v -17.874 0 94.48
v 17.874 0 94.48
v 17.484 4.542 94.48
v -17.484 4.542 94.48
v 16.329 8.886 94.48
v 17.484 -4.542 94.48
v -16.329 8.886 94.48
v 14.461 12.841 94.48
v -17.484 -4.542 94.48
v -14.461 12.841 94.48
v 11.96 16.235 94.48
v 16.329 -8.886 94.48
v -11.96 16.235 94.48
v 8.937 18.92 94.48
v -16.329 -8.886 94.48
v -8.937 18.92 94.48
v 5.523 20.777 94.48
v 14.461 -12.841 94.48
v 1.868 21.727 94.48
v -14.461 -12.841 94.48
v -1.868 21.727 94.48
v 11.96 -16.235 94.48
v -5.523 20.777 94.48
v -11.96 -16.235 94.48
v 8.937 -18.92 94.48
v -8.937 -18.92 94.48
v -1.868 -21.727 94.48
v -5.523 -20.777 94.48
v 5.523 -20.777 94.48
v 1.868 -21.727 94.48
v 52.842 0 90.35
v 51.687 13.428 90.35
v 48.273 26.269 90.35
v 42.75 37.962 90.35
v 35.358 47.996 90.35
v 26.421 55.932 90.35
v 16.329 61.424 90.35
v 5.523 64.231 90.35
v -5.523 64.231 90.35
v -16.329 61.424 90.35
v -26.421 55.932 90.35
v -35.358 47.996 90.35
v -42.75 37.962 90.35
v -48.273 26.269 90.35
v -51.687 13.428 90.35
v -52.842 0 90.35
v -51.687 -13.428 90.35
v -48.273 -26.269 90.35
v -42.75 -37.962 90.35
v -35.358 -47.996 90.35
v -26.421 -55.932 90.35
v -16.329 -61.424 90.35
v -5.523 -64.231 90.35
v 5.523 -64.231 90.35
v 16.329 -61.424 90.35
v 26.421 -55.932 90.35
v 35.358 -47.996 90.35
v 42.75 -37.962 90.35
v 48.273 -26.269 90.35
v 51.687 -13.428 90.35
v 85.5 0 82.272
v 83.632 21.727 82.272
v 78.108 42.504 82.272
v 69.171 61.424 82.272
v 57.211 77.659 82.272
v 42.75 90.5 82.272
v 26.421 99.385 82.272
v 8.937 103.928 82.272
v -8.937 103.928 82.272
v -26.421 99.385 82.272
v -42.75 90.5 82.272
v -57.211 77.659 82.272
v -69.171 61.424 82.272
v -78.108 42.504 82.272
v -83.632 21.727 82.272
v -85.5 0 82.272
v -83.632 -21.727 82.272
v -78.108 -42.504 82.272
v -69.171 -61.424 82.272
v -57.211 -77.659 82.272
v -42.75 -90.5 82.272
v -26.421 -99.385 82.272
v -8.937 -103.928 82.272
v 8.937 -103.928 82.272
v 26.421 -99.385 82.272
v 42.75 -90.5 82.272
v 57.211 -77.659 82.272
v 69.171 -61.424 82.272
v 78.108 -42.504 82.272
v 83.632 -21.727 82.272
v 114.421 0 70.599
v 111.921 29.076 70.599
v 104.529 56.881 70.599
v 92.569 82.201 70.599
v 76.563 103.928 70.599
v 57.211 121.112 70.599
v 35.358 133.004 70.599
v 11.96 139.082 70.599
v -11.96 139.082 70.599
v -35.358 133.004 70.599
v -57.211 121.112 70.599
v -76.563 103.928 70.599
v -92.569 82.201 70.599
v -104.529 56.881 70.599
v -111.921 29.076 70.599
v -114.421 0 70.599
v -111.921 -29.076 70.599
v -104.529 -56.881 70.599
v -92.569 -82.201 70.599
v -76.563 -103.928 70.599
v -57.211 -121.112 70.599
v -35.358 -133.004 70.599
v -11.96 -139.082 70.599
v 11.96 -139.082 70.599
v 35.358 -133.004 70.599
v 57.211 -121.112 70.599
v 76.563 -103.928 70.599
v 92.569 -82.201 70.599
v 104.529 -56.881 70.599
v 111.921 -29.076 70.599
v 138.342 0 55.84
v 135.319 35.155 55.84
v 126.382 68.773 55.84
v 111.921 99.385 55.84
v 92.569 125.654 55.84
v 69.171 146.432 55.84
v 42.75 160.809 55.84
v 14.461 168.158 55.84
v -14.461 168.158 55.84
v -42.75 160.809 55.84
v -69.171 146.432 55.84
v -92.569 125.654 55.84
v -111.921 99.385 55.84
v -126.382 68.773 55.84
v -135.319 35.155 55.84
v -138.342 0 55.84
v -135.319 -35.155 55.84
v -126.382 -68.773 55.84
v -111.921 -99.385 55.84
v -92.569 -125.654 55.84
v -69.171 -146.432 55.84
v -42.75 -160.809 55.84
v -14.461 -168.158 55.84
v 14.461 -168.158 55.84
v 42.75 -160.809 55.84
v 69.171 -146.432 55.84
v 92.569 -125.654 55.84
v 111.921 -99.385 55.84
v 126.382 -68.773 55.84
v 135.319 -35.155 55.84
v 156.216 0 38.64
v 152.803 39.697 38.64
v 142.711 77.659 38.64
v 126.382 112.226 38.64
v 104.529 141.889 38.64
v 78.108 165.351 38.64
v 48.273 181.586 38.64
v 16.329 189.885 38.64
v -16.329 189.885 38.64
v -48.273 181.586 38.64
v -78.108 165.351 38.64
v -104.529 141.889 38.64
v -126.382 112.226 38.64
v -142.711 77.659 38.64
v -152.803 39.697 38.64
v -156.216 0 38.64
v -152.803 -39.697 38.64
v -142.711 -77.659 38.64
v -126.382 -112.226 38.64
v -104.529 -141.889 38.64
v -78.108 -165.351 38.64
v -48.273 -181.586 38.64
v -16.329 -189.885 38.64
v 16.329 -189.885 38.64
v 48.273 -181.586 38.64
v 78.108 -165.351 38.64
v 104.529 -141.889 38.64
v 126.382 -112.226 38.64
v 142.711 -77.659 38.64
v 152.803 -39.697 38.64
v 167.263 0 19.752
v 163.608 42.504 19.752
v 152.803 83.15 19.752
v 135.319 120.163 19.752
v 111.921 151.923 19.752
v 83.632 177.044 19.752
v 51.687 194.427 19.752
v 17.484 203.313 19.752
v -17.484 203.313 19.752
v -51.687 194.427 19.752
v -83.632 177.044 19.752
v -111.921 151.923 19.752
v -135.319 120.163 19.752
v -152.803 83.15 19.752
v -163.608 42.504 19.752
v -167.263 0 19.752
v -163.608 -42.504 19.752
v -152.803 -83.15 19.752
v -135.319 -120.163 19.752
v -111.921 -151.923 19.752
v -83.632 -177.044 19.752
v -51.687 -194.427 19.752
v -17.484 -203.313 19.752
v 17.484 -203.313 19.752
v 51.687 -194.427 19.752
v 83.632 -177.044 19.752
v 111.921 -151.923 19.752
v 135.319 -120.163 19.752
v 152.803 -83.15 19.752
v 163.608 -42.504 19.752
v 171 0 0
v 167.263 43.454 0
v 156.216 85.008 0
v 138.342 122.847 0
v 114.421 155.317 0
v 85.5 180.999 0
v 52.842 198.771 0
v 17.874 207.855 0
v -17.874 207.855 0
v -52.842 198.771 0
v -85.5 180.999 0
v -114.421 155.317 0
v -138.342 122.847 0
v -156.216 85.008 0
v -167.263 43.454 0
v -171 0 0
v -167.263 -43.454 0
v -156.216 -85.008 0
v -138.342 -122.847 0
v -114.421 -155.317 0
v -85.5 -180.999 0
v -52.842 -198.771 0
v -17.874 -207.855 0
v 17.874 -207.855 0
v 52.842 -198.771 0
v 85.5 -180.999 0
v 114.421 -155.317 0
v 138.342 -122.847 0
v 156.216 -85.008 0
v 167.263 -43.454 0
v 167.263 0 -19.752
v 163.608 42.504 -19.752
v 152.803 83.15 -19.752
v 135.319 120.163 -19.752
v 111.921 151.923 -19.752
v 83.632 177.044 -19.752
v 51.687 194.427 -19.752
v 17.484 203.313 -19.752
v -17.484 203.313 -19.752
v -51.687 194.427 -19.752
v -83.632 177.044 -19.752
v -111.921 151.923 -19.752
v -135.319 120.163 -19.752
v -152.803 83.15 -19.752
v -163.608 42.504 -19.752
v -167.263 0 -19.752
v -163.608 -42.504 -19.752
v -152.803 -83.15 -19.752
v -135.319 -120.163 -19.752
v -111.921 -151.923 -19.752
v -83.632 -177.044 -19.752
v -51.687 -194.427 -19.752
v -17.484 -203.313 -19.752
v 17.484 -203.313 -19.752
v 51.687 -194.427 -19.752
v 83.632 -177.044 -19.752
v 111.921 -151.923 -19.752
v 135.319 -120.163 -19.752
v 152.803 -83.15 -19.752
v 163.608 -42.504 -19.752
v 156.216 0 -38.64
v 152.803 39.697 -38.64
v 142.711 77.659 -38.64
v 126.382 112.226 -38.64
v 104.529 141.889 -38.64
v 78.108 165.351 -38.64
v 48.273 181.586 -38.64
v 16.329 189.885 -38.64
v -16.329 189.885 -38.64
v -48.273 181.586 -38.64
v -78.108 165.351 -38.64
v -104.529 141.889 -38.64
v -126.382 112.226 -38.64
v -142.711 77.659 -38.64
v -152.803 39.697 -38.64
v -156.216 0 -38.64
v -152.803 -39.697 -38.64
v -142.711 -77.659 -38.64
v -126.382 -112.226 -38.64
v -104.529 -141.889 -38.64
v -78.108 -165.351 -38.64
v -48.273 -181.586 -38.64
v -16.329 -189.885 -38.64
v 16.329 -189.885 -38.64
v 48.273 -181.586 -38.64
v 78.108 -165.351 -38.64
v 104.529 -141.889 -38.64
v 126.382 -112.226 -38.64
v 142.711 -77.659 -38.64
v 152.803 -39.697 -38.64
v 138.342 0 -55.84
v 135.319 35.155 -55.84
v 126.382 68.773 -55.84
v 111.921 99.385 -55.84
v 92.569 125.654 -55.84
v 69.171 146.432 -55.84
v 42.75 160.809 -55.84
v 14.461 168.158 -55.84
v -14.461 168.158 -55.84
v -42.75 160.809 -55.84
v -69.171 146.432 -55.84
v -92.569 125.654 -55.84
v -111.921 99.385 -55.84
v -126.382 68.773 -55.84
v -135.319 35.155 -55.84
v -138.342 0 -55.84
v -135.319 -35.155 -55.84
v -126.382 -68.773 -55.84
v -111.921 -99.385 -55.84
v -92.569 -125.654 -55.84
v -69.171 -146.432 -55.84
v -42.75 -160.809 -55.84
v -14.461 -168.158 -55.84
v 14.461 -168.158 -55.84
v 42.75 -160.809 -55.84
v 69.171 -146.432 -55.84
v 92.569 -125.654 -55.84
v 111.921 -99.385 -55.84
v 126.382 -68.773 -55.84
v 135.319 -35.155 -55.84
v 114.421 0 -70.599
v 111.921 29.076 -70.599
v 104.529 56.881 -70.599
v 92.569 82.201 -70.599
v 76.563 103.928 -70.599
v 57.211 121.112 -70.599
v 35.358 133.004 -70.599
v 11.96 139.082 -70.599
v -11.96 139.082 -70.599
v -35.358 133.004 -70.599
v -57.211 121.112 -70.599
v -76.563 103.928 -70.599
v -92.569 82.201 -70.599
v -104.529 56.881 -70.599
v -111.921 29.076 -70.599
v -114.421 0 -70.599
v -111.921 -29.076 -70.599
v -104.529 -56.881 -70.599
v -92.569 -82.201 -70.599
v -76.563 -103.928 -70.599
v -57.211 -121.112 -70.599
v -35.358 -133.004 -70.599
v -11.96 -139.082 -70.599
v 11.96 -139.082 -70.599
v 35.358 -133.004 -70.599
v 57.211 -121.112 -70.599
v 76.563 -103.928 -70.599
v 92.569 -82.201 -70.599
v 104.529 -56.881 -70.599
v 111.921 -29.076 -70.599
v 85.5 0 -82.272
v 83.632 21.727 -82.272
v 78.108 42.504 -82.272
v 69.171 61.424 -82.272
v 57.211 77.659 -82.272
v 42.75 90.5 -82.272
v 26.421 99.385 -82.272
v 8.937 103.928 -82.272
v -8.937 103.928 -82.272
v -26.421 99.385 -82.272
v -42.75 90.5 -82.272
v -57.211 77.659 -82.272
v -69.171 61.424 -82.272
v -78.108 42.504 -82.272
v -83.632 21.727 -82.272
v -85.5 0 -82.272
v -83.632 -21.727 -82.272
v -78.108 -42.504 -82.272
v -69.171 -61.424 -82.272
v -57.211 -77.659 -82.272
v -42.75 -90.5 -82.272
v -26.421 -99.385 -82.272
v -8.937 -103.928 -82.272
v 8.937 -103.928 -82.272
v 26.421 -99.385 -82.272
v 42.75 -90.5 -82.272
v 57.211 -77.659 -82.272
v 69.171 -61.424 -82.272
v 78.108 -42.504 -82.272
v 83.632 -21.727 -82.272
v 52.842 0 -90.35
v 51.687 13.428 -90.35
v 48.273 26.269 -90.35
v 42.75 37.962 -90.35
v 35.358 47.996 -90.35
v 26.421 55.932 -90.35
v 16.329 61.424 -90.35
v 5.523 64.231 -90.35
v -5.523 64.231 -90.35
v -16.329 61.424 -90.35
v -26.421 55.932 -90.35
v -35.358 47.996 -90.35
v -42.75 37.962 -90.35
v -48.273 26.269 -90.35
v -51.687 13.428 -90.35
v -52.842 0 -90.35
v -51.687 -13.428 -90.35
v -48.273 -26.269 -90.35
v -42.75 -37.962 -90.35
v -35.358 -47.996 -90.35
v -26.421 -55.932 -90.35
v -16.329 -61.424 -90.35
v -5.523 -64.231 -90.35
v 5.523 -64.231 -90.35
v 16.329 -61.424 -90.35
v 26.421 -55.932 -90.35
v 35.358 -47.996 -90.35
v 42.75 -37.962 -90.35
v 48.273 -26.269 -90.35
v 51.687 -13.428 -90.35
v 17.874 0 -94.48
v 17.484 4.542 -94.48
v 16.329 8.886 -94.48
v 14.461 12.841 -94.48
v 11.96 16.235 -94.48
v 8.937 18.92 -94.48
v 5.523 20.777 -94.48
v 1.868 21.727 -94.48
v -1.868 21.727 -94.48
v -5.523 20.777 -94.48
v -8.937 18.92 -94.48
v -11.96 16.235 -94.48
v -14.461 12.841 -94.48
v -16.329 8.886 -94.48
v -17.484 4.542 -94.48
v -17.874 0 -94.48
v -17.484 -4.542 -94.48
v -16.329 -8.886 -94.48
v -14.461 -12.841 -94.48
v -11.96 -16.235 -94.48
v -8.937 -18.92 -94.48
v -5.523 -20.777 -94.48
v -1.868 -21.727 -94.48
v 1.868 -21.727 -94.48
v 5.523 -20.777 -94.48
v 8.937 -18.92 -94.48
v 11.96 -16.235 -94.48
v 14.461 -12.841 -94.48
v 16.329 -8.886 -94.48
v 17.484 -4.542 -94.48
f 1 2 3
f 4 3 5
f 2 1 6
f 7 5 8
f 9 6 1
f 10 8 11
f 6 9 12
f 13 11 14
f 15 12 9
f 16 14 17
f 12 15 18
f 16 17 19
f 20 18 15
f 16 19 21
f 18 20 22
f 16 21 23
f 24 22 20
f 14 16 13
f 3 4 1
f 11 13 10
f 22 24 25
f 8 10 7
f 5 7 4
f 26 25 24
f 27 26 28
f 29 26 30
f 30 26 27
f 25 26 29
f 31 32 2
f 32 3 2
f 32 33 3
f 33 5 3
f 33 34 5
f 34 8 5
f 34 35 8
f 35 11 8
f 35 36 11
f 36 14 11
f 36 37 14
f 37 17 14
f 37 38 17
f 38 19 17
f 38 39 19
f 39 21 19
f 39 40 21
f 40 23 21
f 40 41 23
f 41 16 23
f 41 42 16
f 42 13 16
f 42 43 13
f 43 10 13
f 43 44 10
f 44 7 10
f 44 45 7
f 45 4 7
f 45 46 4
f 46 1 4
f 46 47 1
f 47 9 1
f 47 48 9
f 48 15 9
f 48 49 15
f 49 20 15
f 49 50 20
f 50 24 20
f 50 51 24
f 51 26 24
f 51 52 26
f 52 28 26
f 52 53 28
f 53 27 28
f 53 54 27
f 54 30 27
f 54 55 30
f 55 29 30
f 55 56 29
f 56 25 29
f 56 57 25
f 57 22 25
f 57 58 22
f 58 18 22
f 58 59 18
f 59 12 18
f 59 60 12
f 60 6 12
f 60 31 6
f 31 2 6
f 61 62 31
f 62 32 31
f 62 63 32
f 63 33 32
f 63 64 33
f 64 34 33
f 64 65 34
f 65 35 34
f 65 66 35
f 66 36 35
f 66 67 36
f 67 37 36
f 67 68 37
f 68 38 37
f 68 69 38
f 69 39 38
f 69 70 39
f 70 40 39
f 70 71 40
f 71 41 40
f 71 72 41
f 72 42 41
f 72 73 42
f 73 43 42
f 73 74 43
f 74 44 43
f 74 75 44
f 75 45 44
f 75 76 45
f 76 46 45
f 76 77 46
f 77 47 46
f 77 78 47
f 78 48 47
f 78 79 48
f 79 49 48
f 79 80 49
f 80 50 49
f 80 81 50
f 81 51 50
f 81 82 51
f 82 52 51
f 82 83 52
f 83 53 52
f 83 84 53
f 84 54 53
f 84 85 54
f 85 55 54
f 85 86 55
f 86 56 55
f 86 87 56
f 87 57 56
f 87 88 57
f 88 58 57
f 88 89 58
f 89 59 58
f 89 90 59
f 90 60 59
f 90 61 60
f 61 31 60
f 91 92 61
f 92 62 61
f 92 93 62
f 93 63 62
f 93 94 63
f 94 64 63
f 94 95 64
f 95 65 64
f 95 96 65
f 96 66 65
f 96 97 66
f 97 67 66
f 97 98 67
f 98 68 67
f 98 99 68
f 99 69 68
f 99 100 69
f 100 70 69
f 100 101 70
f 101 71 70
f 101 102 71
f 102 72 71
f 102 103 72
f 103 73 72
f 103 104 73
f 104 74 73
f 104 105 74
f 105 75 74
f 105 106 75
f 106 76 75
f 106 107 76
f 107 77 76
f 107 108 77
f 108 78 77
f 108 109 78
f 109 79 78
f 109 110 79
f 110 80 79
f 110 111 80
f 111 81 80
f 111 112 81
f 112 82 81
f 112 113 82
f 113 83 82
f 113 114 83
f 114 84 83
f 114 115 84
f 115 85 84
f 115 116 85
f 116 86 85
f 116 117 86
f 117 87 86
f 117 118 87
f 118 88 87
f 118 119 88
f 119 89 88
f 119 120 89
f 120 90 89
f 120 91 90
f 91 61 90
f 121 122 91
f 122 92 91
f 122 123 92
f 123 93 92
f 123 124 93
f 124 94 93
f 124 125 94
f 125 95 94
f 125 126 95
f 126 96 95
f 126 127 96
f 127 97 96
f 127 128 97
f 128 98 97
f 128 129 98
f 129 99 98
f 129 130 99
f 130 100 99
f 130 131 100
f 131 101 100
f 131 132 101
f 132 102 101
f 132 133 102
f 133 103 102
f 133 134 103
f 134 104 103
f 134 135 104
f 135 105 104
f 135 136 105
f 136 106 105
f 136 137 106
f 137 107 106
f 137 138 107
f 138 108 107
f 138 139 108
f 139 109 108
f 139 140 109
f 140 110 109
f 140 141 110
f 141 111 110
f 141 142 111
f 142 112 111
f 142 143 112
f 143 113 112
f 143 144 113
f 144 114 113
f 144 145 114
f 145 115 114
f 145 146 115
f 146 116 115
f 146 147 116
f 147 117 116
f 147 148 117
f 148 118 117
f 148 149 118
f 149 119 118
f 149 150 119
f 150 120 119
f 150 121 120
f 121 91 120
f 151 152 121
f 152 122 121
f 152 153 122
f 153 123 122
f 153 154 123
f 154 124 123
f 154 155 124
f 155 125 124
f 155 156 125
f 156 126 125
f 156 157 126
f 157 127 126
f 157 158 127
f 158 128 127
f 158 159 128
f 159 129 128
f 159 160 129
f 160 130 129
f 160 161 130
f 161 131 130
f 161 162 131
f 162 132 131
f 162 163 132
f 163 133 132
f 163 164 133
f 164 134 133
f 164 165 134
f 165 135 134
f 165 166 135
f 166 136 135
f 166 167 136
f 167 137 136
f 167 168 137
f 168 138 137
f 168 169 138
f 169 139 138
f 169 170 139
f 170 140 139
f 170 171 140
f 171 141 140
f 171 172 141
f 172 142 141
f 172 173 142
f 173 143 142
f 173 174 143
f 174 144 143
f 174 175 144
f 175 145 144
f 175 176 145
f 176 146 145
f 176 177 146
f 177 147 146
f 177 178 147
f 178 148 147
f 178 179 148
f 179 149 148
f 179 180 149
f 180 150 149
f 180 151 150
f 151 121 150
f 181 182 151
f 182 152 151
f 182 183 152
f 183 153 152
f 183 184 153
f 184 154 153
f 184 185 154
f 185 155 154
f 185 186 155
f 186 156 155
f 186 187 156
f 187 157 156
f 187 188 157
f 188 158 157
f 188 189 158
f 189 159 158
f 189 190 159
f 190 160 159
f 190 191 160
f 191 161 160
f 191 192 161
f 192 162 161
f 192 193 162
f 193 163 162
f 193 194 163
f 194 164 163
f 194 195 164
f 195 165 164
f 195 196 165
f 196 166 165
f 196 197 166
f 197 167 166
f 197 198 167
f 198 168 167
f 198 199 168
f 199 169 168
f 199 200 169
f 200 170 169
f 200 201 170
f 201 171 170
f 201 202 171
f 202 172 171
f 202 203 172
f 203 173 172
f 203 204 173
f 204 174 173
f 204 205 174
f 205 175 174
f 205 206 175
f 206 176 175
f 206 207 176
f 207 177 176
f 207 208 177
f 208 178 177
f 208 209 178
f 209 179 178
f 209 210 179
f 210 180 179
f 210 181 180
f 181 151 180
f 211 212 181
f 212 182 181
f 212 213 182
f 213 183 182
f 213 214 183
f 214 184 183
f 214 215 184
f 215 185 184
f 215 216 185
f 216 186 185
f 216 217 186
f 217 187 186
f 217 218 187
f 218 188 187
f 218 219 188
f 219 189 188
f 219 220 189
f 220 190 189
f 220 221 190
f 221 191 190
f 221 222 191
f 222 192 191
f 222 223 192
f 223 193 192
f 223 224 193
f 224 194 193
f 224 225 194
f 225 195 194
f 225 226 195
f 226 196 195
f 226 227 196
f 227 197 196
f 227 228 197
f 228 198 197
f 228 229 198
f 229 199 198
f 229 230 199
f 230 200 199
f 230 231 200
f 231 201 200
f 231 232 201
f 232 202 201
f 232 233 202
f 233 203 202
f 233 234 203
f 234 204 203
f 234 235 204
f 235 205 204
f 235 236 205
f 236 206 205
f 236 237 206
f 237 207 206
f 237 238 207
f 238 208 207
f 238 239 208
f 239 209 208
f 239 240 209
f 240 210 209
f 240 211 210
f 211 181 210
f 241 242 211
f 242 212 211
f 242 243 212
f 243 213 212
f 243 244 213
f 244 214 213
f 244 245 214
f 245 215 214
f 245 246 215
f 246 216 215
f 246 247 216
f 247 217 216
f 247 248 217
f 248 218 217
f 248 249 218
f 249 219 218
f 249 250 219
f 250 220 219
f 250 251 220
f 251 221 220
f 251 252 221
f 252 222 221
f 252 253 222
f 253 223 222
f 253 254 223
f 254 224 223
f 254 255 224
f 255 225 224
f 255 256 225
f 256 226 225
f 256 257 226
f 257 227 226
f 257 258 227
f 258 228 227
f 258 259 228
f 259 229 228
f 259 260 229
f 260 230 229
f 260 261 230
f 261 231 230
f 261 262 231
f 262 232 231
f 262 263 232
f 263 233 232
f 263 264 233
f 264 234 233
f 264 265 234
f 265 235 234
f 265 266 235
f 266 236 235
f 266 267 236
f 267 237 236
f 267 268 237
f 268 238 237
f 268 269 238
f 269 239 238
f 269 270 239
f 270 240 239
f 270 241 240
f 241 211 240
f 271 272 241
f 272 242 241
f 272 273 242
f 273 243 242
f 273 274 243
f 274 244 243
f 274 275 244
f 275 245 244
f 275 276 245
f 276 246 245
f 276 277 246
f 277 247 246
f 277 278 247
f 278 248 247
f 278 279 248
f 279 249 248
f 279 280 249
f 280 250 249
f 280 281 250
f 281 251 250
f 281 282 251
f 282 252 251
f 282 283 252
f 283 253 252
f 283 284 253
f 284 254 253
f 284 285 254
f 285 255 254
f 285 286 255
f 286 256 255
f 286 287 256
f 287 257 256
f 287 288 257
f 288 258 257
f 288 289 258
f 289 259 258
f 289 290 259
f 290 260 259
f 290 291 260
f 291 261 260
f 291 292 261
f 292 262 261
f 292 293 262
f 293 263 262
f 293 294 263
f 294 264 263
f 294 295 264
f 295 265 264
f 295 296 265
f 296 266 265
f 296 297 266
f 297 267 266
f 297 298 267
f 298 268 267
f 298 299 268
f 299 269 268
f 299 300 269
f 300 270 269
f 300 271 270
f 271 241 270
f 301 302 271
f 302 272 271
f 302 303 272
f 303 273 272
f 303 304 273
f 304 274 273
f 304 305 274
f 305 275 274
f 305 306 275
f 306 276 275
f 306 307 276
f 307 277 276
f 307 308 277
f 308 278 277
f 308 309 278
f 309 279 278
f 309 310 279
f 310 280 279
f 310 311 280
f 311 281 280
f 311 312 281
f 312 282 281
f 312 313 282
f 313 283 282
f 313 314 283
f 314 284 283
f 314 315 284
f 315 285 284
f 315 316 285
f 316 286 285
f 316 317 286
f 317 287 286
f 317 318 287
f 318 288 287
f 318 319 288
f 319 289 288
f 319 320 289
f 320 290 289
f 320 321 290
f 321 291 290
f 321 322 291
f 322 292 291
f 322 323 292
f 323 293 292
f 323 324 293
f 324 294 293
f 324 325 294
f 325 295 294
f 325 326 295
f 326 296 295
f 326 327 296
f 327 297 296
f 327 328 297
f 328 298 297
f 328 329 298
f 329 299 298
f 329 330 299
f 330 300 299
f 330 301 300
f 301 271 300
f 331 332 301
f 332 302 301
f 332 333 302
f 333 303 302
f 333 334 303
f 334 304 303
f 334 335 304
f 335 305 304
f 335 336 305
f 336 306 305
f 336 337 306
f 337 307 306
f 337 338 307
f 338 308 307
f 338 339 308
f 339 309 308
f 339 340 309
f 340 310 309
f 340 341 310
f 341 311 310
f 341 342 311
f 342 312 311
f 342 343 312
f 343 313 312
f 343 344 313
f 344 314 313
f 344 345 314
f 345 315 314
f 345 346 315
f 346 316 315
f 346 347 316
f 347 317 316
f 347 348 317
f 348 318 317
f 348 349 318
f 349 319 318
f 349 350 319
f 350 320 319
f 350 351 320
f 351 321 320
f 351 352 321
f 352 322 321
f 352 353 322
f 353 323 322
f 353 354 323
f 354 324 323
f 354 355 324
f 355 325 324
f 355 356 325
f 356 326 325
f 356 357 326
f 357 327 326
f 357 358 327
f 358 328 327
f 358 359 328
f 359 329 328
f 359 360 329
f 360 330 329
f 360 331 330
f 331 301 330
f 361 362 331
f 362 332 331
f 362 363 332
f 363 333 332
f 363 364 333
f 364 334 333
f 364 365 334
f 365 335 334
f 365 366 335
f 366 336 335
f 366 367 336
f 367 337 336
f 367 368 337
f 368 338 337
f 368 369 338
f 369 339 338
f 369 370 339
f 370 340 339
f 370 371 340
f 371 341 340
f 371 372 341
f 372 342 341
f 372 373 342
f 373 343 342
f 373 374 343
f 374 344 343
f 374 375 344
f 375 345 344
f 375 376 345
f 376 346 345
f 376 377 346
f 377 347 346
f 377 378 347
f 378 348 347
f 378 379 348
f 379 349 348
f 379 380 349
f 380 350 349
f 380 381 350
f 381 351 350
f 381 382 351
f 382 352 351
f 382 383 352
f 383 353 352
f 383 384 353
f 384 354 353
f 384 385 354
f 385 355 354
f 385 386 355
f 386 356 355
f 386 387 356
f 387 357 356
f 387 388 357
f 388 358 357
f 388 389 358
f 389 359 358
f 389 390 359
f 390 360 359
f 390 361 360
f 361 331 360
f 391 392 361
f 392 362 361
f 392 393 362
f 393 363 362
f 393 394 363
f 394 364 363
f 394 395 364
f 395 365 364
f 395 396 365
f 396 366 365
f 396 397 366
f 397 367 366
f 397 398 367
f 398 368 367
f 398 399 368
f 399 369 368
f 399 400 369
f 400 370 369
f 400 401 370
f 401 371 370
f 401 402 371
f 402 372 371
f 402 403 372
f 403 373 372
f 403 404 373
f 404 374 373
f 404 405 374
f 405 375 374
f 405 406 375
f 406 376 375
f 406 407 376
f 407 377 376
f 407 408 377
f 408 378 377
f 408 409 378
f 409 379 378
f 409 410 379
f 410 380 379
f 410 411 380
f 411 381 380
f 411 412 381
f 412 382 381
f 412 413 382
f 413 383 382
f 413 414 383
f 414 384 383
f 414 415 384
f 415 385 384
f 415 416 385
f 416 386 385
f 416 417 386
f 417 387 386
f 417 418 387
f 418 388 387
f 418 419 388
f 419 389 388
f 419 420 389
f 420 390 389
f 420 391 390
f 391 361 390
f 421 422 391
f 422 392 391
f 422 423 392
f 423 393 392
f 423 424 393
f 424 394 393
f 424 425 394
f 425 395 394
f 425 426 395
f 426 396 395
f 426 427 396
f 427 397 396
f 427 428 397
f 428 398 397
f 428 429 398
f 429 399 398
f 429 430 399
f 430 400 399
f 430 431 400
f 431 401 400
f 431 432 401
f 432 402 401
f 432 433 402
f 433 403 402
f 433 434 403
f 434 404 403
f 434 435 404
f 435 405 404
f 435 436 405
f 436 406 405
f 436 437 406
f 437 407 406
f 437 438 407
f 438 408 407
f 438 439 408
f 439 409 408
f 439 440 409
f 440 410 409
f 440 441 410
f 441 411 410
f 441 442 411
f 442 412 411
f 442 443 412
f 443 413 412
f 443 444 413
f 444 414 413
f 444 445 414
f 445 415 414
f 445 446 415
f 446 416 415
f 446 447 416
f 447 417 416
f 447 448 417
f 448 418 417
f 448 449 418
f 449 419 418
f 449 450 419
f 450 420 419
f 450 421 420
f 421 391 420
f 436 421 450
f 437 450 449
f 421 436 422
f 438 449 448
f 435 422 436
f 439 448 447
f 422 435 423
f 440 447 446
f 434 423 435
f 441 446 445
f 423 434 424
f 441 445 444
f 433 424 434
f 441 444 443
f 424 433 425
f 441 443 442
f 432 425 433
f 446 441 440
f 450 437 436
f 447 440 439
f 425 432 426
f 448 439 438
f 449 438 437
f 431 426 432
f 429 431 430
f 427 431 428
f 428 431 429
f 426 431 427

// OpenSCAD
// Generated by SolidPython 1.0.1 on 2020-07-29 00:46:48


scale(v = [9, 11, 5]) {
	sphere(r = 19);
}
/***********************************************
*********      SolidPython code:      **********
************************************************
 
# import packages: SolidPython
from solid import *
from solid.utils import *
from itertools import chain, combinations, permutations


class Resize:

    def __init__(self, scad_file):
        self.scad_file = scad_file
        #self.scad_file = import_scad(scad_file)
        # cone/cylinder param:
        self.r1 = 0
        self.r2 = 0
        self.h = 0
        # rectangular prism param:
        self.w = 0
        self.l = 0
        # ellipse param:
        self.r = 0

    # import OpenScad code (file name corresponds to shape)


    # classify shape + parameters
    def assign(self, param1, param2, param3):
        if self.scad_file == 'cone.scad':
            self.r1 = param1
            self.r2 = param2
            self.h = param3
        elif self.scad_file == 'cylinder.scad':
            self.r1 = param1
            self.r2 = param2
            self.h = param3
        elif self.scad_file == 'rectangularPrism.scad':
            self.h = param1
            self.l = param2
            self.w = param3
        else:
            self.r = param1
            self.h = param2

    # resize parameters
    def iterate(self):
        x = range(3, 20, 2)
        i = 1
        if self.scad_file == 'cone.scad':
            tempList = list(permutations(x, 2))
            for temp in tempList:
                param1 = temp[0]
                param2 = temp[1]
                filepath = 'produced_scad_files/' + 'cone' + str(param1) + '_' + str(param2) + '_' + '.scad'
                scad_render_to_file(cylinder(h=param1, r1=param2, r2=0), filepath)

        elif self.scad_file == 'cylinder.scad':
            tempList = list(permutations(x, 3))
            for temp in tempList:
                param1 = temp[0]
                param2 = temp[1]
                filepath = 'produced_scad_files/' + 'cylinder' + str(param1) + '_' + str(param2) + '_' + '.scad'
                scad_render_to_file(cylinder(h=param1, r1=param2, r2=param2), filepath)

        elif self.scad_file == 'rectangularPrism.scad':
            tempList = list(permutations(x, 3))
            for temp in tempList:
                param1 = temp[0]
                param2 = temp[1]
                param3 = temp[2]
                filepath = 'produced_scad_files/' + 'rectangularPrism' + str(param1) + '_' + str(param2) + '_' + str(
                    param3) + '.scad'
                scad_render_to_file(cube(size=(param1, param2, param3)), filepath)

        elif self.scad_file == 'ellipse.scad':
            tempList = list(permutations(x, 4))
            for temp in tempList:
                param1 = temp[0]
                param2 = temp[1]
                param3 = temp[2]
                param4 = temp[3]
                filepath = 'produced_scad_files/' + 'ellipse' + str(param1) + '_' + str(param2) + '_' + str(param3) + '_' + str(param4) + '.scad'
                scad_render_to_file(scale([param1, param2, param3])(sphere(r=param4)), filepath)

    def render_to_scadfile(self):
        scad_render_to_file(scad, 'example.scad') 
 
************************************************/
